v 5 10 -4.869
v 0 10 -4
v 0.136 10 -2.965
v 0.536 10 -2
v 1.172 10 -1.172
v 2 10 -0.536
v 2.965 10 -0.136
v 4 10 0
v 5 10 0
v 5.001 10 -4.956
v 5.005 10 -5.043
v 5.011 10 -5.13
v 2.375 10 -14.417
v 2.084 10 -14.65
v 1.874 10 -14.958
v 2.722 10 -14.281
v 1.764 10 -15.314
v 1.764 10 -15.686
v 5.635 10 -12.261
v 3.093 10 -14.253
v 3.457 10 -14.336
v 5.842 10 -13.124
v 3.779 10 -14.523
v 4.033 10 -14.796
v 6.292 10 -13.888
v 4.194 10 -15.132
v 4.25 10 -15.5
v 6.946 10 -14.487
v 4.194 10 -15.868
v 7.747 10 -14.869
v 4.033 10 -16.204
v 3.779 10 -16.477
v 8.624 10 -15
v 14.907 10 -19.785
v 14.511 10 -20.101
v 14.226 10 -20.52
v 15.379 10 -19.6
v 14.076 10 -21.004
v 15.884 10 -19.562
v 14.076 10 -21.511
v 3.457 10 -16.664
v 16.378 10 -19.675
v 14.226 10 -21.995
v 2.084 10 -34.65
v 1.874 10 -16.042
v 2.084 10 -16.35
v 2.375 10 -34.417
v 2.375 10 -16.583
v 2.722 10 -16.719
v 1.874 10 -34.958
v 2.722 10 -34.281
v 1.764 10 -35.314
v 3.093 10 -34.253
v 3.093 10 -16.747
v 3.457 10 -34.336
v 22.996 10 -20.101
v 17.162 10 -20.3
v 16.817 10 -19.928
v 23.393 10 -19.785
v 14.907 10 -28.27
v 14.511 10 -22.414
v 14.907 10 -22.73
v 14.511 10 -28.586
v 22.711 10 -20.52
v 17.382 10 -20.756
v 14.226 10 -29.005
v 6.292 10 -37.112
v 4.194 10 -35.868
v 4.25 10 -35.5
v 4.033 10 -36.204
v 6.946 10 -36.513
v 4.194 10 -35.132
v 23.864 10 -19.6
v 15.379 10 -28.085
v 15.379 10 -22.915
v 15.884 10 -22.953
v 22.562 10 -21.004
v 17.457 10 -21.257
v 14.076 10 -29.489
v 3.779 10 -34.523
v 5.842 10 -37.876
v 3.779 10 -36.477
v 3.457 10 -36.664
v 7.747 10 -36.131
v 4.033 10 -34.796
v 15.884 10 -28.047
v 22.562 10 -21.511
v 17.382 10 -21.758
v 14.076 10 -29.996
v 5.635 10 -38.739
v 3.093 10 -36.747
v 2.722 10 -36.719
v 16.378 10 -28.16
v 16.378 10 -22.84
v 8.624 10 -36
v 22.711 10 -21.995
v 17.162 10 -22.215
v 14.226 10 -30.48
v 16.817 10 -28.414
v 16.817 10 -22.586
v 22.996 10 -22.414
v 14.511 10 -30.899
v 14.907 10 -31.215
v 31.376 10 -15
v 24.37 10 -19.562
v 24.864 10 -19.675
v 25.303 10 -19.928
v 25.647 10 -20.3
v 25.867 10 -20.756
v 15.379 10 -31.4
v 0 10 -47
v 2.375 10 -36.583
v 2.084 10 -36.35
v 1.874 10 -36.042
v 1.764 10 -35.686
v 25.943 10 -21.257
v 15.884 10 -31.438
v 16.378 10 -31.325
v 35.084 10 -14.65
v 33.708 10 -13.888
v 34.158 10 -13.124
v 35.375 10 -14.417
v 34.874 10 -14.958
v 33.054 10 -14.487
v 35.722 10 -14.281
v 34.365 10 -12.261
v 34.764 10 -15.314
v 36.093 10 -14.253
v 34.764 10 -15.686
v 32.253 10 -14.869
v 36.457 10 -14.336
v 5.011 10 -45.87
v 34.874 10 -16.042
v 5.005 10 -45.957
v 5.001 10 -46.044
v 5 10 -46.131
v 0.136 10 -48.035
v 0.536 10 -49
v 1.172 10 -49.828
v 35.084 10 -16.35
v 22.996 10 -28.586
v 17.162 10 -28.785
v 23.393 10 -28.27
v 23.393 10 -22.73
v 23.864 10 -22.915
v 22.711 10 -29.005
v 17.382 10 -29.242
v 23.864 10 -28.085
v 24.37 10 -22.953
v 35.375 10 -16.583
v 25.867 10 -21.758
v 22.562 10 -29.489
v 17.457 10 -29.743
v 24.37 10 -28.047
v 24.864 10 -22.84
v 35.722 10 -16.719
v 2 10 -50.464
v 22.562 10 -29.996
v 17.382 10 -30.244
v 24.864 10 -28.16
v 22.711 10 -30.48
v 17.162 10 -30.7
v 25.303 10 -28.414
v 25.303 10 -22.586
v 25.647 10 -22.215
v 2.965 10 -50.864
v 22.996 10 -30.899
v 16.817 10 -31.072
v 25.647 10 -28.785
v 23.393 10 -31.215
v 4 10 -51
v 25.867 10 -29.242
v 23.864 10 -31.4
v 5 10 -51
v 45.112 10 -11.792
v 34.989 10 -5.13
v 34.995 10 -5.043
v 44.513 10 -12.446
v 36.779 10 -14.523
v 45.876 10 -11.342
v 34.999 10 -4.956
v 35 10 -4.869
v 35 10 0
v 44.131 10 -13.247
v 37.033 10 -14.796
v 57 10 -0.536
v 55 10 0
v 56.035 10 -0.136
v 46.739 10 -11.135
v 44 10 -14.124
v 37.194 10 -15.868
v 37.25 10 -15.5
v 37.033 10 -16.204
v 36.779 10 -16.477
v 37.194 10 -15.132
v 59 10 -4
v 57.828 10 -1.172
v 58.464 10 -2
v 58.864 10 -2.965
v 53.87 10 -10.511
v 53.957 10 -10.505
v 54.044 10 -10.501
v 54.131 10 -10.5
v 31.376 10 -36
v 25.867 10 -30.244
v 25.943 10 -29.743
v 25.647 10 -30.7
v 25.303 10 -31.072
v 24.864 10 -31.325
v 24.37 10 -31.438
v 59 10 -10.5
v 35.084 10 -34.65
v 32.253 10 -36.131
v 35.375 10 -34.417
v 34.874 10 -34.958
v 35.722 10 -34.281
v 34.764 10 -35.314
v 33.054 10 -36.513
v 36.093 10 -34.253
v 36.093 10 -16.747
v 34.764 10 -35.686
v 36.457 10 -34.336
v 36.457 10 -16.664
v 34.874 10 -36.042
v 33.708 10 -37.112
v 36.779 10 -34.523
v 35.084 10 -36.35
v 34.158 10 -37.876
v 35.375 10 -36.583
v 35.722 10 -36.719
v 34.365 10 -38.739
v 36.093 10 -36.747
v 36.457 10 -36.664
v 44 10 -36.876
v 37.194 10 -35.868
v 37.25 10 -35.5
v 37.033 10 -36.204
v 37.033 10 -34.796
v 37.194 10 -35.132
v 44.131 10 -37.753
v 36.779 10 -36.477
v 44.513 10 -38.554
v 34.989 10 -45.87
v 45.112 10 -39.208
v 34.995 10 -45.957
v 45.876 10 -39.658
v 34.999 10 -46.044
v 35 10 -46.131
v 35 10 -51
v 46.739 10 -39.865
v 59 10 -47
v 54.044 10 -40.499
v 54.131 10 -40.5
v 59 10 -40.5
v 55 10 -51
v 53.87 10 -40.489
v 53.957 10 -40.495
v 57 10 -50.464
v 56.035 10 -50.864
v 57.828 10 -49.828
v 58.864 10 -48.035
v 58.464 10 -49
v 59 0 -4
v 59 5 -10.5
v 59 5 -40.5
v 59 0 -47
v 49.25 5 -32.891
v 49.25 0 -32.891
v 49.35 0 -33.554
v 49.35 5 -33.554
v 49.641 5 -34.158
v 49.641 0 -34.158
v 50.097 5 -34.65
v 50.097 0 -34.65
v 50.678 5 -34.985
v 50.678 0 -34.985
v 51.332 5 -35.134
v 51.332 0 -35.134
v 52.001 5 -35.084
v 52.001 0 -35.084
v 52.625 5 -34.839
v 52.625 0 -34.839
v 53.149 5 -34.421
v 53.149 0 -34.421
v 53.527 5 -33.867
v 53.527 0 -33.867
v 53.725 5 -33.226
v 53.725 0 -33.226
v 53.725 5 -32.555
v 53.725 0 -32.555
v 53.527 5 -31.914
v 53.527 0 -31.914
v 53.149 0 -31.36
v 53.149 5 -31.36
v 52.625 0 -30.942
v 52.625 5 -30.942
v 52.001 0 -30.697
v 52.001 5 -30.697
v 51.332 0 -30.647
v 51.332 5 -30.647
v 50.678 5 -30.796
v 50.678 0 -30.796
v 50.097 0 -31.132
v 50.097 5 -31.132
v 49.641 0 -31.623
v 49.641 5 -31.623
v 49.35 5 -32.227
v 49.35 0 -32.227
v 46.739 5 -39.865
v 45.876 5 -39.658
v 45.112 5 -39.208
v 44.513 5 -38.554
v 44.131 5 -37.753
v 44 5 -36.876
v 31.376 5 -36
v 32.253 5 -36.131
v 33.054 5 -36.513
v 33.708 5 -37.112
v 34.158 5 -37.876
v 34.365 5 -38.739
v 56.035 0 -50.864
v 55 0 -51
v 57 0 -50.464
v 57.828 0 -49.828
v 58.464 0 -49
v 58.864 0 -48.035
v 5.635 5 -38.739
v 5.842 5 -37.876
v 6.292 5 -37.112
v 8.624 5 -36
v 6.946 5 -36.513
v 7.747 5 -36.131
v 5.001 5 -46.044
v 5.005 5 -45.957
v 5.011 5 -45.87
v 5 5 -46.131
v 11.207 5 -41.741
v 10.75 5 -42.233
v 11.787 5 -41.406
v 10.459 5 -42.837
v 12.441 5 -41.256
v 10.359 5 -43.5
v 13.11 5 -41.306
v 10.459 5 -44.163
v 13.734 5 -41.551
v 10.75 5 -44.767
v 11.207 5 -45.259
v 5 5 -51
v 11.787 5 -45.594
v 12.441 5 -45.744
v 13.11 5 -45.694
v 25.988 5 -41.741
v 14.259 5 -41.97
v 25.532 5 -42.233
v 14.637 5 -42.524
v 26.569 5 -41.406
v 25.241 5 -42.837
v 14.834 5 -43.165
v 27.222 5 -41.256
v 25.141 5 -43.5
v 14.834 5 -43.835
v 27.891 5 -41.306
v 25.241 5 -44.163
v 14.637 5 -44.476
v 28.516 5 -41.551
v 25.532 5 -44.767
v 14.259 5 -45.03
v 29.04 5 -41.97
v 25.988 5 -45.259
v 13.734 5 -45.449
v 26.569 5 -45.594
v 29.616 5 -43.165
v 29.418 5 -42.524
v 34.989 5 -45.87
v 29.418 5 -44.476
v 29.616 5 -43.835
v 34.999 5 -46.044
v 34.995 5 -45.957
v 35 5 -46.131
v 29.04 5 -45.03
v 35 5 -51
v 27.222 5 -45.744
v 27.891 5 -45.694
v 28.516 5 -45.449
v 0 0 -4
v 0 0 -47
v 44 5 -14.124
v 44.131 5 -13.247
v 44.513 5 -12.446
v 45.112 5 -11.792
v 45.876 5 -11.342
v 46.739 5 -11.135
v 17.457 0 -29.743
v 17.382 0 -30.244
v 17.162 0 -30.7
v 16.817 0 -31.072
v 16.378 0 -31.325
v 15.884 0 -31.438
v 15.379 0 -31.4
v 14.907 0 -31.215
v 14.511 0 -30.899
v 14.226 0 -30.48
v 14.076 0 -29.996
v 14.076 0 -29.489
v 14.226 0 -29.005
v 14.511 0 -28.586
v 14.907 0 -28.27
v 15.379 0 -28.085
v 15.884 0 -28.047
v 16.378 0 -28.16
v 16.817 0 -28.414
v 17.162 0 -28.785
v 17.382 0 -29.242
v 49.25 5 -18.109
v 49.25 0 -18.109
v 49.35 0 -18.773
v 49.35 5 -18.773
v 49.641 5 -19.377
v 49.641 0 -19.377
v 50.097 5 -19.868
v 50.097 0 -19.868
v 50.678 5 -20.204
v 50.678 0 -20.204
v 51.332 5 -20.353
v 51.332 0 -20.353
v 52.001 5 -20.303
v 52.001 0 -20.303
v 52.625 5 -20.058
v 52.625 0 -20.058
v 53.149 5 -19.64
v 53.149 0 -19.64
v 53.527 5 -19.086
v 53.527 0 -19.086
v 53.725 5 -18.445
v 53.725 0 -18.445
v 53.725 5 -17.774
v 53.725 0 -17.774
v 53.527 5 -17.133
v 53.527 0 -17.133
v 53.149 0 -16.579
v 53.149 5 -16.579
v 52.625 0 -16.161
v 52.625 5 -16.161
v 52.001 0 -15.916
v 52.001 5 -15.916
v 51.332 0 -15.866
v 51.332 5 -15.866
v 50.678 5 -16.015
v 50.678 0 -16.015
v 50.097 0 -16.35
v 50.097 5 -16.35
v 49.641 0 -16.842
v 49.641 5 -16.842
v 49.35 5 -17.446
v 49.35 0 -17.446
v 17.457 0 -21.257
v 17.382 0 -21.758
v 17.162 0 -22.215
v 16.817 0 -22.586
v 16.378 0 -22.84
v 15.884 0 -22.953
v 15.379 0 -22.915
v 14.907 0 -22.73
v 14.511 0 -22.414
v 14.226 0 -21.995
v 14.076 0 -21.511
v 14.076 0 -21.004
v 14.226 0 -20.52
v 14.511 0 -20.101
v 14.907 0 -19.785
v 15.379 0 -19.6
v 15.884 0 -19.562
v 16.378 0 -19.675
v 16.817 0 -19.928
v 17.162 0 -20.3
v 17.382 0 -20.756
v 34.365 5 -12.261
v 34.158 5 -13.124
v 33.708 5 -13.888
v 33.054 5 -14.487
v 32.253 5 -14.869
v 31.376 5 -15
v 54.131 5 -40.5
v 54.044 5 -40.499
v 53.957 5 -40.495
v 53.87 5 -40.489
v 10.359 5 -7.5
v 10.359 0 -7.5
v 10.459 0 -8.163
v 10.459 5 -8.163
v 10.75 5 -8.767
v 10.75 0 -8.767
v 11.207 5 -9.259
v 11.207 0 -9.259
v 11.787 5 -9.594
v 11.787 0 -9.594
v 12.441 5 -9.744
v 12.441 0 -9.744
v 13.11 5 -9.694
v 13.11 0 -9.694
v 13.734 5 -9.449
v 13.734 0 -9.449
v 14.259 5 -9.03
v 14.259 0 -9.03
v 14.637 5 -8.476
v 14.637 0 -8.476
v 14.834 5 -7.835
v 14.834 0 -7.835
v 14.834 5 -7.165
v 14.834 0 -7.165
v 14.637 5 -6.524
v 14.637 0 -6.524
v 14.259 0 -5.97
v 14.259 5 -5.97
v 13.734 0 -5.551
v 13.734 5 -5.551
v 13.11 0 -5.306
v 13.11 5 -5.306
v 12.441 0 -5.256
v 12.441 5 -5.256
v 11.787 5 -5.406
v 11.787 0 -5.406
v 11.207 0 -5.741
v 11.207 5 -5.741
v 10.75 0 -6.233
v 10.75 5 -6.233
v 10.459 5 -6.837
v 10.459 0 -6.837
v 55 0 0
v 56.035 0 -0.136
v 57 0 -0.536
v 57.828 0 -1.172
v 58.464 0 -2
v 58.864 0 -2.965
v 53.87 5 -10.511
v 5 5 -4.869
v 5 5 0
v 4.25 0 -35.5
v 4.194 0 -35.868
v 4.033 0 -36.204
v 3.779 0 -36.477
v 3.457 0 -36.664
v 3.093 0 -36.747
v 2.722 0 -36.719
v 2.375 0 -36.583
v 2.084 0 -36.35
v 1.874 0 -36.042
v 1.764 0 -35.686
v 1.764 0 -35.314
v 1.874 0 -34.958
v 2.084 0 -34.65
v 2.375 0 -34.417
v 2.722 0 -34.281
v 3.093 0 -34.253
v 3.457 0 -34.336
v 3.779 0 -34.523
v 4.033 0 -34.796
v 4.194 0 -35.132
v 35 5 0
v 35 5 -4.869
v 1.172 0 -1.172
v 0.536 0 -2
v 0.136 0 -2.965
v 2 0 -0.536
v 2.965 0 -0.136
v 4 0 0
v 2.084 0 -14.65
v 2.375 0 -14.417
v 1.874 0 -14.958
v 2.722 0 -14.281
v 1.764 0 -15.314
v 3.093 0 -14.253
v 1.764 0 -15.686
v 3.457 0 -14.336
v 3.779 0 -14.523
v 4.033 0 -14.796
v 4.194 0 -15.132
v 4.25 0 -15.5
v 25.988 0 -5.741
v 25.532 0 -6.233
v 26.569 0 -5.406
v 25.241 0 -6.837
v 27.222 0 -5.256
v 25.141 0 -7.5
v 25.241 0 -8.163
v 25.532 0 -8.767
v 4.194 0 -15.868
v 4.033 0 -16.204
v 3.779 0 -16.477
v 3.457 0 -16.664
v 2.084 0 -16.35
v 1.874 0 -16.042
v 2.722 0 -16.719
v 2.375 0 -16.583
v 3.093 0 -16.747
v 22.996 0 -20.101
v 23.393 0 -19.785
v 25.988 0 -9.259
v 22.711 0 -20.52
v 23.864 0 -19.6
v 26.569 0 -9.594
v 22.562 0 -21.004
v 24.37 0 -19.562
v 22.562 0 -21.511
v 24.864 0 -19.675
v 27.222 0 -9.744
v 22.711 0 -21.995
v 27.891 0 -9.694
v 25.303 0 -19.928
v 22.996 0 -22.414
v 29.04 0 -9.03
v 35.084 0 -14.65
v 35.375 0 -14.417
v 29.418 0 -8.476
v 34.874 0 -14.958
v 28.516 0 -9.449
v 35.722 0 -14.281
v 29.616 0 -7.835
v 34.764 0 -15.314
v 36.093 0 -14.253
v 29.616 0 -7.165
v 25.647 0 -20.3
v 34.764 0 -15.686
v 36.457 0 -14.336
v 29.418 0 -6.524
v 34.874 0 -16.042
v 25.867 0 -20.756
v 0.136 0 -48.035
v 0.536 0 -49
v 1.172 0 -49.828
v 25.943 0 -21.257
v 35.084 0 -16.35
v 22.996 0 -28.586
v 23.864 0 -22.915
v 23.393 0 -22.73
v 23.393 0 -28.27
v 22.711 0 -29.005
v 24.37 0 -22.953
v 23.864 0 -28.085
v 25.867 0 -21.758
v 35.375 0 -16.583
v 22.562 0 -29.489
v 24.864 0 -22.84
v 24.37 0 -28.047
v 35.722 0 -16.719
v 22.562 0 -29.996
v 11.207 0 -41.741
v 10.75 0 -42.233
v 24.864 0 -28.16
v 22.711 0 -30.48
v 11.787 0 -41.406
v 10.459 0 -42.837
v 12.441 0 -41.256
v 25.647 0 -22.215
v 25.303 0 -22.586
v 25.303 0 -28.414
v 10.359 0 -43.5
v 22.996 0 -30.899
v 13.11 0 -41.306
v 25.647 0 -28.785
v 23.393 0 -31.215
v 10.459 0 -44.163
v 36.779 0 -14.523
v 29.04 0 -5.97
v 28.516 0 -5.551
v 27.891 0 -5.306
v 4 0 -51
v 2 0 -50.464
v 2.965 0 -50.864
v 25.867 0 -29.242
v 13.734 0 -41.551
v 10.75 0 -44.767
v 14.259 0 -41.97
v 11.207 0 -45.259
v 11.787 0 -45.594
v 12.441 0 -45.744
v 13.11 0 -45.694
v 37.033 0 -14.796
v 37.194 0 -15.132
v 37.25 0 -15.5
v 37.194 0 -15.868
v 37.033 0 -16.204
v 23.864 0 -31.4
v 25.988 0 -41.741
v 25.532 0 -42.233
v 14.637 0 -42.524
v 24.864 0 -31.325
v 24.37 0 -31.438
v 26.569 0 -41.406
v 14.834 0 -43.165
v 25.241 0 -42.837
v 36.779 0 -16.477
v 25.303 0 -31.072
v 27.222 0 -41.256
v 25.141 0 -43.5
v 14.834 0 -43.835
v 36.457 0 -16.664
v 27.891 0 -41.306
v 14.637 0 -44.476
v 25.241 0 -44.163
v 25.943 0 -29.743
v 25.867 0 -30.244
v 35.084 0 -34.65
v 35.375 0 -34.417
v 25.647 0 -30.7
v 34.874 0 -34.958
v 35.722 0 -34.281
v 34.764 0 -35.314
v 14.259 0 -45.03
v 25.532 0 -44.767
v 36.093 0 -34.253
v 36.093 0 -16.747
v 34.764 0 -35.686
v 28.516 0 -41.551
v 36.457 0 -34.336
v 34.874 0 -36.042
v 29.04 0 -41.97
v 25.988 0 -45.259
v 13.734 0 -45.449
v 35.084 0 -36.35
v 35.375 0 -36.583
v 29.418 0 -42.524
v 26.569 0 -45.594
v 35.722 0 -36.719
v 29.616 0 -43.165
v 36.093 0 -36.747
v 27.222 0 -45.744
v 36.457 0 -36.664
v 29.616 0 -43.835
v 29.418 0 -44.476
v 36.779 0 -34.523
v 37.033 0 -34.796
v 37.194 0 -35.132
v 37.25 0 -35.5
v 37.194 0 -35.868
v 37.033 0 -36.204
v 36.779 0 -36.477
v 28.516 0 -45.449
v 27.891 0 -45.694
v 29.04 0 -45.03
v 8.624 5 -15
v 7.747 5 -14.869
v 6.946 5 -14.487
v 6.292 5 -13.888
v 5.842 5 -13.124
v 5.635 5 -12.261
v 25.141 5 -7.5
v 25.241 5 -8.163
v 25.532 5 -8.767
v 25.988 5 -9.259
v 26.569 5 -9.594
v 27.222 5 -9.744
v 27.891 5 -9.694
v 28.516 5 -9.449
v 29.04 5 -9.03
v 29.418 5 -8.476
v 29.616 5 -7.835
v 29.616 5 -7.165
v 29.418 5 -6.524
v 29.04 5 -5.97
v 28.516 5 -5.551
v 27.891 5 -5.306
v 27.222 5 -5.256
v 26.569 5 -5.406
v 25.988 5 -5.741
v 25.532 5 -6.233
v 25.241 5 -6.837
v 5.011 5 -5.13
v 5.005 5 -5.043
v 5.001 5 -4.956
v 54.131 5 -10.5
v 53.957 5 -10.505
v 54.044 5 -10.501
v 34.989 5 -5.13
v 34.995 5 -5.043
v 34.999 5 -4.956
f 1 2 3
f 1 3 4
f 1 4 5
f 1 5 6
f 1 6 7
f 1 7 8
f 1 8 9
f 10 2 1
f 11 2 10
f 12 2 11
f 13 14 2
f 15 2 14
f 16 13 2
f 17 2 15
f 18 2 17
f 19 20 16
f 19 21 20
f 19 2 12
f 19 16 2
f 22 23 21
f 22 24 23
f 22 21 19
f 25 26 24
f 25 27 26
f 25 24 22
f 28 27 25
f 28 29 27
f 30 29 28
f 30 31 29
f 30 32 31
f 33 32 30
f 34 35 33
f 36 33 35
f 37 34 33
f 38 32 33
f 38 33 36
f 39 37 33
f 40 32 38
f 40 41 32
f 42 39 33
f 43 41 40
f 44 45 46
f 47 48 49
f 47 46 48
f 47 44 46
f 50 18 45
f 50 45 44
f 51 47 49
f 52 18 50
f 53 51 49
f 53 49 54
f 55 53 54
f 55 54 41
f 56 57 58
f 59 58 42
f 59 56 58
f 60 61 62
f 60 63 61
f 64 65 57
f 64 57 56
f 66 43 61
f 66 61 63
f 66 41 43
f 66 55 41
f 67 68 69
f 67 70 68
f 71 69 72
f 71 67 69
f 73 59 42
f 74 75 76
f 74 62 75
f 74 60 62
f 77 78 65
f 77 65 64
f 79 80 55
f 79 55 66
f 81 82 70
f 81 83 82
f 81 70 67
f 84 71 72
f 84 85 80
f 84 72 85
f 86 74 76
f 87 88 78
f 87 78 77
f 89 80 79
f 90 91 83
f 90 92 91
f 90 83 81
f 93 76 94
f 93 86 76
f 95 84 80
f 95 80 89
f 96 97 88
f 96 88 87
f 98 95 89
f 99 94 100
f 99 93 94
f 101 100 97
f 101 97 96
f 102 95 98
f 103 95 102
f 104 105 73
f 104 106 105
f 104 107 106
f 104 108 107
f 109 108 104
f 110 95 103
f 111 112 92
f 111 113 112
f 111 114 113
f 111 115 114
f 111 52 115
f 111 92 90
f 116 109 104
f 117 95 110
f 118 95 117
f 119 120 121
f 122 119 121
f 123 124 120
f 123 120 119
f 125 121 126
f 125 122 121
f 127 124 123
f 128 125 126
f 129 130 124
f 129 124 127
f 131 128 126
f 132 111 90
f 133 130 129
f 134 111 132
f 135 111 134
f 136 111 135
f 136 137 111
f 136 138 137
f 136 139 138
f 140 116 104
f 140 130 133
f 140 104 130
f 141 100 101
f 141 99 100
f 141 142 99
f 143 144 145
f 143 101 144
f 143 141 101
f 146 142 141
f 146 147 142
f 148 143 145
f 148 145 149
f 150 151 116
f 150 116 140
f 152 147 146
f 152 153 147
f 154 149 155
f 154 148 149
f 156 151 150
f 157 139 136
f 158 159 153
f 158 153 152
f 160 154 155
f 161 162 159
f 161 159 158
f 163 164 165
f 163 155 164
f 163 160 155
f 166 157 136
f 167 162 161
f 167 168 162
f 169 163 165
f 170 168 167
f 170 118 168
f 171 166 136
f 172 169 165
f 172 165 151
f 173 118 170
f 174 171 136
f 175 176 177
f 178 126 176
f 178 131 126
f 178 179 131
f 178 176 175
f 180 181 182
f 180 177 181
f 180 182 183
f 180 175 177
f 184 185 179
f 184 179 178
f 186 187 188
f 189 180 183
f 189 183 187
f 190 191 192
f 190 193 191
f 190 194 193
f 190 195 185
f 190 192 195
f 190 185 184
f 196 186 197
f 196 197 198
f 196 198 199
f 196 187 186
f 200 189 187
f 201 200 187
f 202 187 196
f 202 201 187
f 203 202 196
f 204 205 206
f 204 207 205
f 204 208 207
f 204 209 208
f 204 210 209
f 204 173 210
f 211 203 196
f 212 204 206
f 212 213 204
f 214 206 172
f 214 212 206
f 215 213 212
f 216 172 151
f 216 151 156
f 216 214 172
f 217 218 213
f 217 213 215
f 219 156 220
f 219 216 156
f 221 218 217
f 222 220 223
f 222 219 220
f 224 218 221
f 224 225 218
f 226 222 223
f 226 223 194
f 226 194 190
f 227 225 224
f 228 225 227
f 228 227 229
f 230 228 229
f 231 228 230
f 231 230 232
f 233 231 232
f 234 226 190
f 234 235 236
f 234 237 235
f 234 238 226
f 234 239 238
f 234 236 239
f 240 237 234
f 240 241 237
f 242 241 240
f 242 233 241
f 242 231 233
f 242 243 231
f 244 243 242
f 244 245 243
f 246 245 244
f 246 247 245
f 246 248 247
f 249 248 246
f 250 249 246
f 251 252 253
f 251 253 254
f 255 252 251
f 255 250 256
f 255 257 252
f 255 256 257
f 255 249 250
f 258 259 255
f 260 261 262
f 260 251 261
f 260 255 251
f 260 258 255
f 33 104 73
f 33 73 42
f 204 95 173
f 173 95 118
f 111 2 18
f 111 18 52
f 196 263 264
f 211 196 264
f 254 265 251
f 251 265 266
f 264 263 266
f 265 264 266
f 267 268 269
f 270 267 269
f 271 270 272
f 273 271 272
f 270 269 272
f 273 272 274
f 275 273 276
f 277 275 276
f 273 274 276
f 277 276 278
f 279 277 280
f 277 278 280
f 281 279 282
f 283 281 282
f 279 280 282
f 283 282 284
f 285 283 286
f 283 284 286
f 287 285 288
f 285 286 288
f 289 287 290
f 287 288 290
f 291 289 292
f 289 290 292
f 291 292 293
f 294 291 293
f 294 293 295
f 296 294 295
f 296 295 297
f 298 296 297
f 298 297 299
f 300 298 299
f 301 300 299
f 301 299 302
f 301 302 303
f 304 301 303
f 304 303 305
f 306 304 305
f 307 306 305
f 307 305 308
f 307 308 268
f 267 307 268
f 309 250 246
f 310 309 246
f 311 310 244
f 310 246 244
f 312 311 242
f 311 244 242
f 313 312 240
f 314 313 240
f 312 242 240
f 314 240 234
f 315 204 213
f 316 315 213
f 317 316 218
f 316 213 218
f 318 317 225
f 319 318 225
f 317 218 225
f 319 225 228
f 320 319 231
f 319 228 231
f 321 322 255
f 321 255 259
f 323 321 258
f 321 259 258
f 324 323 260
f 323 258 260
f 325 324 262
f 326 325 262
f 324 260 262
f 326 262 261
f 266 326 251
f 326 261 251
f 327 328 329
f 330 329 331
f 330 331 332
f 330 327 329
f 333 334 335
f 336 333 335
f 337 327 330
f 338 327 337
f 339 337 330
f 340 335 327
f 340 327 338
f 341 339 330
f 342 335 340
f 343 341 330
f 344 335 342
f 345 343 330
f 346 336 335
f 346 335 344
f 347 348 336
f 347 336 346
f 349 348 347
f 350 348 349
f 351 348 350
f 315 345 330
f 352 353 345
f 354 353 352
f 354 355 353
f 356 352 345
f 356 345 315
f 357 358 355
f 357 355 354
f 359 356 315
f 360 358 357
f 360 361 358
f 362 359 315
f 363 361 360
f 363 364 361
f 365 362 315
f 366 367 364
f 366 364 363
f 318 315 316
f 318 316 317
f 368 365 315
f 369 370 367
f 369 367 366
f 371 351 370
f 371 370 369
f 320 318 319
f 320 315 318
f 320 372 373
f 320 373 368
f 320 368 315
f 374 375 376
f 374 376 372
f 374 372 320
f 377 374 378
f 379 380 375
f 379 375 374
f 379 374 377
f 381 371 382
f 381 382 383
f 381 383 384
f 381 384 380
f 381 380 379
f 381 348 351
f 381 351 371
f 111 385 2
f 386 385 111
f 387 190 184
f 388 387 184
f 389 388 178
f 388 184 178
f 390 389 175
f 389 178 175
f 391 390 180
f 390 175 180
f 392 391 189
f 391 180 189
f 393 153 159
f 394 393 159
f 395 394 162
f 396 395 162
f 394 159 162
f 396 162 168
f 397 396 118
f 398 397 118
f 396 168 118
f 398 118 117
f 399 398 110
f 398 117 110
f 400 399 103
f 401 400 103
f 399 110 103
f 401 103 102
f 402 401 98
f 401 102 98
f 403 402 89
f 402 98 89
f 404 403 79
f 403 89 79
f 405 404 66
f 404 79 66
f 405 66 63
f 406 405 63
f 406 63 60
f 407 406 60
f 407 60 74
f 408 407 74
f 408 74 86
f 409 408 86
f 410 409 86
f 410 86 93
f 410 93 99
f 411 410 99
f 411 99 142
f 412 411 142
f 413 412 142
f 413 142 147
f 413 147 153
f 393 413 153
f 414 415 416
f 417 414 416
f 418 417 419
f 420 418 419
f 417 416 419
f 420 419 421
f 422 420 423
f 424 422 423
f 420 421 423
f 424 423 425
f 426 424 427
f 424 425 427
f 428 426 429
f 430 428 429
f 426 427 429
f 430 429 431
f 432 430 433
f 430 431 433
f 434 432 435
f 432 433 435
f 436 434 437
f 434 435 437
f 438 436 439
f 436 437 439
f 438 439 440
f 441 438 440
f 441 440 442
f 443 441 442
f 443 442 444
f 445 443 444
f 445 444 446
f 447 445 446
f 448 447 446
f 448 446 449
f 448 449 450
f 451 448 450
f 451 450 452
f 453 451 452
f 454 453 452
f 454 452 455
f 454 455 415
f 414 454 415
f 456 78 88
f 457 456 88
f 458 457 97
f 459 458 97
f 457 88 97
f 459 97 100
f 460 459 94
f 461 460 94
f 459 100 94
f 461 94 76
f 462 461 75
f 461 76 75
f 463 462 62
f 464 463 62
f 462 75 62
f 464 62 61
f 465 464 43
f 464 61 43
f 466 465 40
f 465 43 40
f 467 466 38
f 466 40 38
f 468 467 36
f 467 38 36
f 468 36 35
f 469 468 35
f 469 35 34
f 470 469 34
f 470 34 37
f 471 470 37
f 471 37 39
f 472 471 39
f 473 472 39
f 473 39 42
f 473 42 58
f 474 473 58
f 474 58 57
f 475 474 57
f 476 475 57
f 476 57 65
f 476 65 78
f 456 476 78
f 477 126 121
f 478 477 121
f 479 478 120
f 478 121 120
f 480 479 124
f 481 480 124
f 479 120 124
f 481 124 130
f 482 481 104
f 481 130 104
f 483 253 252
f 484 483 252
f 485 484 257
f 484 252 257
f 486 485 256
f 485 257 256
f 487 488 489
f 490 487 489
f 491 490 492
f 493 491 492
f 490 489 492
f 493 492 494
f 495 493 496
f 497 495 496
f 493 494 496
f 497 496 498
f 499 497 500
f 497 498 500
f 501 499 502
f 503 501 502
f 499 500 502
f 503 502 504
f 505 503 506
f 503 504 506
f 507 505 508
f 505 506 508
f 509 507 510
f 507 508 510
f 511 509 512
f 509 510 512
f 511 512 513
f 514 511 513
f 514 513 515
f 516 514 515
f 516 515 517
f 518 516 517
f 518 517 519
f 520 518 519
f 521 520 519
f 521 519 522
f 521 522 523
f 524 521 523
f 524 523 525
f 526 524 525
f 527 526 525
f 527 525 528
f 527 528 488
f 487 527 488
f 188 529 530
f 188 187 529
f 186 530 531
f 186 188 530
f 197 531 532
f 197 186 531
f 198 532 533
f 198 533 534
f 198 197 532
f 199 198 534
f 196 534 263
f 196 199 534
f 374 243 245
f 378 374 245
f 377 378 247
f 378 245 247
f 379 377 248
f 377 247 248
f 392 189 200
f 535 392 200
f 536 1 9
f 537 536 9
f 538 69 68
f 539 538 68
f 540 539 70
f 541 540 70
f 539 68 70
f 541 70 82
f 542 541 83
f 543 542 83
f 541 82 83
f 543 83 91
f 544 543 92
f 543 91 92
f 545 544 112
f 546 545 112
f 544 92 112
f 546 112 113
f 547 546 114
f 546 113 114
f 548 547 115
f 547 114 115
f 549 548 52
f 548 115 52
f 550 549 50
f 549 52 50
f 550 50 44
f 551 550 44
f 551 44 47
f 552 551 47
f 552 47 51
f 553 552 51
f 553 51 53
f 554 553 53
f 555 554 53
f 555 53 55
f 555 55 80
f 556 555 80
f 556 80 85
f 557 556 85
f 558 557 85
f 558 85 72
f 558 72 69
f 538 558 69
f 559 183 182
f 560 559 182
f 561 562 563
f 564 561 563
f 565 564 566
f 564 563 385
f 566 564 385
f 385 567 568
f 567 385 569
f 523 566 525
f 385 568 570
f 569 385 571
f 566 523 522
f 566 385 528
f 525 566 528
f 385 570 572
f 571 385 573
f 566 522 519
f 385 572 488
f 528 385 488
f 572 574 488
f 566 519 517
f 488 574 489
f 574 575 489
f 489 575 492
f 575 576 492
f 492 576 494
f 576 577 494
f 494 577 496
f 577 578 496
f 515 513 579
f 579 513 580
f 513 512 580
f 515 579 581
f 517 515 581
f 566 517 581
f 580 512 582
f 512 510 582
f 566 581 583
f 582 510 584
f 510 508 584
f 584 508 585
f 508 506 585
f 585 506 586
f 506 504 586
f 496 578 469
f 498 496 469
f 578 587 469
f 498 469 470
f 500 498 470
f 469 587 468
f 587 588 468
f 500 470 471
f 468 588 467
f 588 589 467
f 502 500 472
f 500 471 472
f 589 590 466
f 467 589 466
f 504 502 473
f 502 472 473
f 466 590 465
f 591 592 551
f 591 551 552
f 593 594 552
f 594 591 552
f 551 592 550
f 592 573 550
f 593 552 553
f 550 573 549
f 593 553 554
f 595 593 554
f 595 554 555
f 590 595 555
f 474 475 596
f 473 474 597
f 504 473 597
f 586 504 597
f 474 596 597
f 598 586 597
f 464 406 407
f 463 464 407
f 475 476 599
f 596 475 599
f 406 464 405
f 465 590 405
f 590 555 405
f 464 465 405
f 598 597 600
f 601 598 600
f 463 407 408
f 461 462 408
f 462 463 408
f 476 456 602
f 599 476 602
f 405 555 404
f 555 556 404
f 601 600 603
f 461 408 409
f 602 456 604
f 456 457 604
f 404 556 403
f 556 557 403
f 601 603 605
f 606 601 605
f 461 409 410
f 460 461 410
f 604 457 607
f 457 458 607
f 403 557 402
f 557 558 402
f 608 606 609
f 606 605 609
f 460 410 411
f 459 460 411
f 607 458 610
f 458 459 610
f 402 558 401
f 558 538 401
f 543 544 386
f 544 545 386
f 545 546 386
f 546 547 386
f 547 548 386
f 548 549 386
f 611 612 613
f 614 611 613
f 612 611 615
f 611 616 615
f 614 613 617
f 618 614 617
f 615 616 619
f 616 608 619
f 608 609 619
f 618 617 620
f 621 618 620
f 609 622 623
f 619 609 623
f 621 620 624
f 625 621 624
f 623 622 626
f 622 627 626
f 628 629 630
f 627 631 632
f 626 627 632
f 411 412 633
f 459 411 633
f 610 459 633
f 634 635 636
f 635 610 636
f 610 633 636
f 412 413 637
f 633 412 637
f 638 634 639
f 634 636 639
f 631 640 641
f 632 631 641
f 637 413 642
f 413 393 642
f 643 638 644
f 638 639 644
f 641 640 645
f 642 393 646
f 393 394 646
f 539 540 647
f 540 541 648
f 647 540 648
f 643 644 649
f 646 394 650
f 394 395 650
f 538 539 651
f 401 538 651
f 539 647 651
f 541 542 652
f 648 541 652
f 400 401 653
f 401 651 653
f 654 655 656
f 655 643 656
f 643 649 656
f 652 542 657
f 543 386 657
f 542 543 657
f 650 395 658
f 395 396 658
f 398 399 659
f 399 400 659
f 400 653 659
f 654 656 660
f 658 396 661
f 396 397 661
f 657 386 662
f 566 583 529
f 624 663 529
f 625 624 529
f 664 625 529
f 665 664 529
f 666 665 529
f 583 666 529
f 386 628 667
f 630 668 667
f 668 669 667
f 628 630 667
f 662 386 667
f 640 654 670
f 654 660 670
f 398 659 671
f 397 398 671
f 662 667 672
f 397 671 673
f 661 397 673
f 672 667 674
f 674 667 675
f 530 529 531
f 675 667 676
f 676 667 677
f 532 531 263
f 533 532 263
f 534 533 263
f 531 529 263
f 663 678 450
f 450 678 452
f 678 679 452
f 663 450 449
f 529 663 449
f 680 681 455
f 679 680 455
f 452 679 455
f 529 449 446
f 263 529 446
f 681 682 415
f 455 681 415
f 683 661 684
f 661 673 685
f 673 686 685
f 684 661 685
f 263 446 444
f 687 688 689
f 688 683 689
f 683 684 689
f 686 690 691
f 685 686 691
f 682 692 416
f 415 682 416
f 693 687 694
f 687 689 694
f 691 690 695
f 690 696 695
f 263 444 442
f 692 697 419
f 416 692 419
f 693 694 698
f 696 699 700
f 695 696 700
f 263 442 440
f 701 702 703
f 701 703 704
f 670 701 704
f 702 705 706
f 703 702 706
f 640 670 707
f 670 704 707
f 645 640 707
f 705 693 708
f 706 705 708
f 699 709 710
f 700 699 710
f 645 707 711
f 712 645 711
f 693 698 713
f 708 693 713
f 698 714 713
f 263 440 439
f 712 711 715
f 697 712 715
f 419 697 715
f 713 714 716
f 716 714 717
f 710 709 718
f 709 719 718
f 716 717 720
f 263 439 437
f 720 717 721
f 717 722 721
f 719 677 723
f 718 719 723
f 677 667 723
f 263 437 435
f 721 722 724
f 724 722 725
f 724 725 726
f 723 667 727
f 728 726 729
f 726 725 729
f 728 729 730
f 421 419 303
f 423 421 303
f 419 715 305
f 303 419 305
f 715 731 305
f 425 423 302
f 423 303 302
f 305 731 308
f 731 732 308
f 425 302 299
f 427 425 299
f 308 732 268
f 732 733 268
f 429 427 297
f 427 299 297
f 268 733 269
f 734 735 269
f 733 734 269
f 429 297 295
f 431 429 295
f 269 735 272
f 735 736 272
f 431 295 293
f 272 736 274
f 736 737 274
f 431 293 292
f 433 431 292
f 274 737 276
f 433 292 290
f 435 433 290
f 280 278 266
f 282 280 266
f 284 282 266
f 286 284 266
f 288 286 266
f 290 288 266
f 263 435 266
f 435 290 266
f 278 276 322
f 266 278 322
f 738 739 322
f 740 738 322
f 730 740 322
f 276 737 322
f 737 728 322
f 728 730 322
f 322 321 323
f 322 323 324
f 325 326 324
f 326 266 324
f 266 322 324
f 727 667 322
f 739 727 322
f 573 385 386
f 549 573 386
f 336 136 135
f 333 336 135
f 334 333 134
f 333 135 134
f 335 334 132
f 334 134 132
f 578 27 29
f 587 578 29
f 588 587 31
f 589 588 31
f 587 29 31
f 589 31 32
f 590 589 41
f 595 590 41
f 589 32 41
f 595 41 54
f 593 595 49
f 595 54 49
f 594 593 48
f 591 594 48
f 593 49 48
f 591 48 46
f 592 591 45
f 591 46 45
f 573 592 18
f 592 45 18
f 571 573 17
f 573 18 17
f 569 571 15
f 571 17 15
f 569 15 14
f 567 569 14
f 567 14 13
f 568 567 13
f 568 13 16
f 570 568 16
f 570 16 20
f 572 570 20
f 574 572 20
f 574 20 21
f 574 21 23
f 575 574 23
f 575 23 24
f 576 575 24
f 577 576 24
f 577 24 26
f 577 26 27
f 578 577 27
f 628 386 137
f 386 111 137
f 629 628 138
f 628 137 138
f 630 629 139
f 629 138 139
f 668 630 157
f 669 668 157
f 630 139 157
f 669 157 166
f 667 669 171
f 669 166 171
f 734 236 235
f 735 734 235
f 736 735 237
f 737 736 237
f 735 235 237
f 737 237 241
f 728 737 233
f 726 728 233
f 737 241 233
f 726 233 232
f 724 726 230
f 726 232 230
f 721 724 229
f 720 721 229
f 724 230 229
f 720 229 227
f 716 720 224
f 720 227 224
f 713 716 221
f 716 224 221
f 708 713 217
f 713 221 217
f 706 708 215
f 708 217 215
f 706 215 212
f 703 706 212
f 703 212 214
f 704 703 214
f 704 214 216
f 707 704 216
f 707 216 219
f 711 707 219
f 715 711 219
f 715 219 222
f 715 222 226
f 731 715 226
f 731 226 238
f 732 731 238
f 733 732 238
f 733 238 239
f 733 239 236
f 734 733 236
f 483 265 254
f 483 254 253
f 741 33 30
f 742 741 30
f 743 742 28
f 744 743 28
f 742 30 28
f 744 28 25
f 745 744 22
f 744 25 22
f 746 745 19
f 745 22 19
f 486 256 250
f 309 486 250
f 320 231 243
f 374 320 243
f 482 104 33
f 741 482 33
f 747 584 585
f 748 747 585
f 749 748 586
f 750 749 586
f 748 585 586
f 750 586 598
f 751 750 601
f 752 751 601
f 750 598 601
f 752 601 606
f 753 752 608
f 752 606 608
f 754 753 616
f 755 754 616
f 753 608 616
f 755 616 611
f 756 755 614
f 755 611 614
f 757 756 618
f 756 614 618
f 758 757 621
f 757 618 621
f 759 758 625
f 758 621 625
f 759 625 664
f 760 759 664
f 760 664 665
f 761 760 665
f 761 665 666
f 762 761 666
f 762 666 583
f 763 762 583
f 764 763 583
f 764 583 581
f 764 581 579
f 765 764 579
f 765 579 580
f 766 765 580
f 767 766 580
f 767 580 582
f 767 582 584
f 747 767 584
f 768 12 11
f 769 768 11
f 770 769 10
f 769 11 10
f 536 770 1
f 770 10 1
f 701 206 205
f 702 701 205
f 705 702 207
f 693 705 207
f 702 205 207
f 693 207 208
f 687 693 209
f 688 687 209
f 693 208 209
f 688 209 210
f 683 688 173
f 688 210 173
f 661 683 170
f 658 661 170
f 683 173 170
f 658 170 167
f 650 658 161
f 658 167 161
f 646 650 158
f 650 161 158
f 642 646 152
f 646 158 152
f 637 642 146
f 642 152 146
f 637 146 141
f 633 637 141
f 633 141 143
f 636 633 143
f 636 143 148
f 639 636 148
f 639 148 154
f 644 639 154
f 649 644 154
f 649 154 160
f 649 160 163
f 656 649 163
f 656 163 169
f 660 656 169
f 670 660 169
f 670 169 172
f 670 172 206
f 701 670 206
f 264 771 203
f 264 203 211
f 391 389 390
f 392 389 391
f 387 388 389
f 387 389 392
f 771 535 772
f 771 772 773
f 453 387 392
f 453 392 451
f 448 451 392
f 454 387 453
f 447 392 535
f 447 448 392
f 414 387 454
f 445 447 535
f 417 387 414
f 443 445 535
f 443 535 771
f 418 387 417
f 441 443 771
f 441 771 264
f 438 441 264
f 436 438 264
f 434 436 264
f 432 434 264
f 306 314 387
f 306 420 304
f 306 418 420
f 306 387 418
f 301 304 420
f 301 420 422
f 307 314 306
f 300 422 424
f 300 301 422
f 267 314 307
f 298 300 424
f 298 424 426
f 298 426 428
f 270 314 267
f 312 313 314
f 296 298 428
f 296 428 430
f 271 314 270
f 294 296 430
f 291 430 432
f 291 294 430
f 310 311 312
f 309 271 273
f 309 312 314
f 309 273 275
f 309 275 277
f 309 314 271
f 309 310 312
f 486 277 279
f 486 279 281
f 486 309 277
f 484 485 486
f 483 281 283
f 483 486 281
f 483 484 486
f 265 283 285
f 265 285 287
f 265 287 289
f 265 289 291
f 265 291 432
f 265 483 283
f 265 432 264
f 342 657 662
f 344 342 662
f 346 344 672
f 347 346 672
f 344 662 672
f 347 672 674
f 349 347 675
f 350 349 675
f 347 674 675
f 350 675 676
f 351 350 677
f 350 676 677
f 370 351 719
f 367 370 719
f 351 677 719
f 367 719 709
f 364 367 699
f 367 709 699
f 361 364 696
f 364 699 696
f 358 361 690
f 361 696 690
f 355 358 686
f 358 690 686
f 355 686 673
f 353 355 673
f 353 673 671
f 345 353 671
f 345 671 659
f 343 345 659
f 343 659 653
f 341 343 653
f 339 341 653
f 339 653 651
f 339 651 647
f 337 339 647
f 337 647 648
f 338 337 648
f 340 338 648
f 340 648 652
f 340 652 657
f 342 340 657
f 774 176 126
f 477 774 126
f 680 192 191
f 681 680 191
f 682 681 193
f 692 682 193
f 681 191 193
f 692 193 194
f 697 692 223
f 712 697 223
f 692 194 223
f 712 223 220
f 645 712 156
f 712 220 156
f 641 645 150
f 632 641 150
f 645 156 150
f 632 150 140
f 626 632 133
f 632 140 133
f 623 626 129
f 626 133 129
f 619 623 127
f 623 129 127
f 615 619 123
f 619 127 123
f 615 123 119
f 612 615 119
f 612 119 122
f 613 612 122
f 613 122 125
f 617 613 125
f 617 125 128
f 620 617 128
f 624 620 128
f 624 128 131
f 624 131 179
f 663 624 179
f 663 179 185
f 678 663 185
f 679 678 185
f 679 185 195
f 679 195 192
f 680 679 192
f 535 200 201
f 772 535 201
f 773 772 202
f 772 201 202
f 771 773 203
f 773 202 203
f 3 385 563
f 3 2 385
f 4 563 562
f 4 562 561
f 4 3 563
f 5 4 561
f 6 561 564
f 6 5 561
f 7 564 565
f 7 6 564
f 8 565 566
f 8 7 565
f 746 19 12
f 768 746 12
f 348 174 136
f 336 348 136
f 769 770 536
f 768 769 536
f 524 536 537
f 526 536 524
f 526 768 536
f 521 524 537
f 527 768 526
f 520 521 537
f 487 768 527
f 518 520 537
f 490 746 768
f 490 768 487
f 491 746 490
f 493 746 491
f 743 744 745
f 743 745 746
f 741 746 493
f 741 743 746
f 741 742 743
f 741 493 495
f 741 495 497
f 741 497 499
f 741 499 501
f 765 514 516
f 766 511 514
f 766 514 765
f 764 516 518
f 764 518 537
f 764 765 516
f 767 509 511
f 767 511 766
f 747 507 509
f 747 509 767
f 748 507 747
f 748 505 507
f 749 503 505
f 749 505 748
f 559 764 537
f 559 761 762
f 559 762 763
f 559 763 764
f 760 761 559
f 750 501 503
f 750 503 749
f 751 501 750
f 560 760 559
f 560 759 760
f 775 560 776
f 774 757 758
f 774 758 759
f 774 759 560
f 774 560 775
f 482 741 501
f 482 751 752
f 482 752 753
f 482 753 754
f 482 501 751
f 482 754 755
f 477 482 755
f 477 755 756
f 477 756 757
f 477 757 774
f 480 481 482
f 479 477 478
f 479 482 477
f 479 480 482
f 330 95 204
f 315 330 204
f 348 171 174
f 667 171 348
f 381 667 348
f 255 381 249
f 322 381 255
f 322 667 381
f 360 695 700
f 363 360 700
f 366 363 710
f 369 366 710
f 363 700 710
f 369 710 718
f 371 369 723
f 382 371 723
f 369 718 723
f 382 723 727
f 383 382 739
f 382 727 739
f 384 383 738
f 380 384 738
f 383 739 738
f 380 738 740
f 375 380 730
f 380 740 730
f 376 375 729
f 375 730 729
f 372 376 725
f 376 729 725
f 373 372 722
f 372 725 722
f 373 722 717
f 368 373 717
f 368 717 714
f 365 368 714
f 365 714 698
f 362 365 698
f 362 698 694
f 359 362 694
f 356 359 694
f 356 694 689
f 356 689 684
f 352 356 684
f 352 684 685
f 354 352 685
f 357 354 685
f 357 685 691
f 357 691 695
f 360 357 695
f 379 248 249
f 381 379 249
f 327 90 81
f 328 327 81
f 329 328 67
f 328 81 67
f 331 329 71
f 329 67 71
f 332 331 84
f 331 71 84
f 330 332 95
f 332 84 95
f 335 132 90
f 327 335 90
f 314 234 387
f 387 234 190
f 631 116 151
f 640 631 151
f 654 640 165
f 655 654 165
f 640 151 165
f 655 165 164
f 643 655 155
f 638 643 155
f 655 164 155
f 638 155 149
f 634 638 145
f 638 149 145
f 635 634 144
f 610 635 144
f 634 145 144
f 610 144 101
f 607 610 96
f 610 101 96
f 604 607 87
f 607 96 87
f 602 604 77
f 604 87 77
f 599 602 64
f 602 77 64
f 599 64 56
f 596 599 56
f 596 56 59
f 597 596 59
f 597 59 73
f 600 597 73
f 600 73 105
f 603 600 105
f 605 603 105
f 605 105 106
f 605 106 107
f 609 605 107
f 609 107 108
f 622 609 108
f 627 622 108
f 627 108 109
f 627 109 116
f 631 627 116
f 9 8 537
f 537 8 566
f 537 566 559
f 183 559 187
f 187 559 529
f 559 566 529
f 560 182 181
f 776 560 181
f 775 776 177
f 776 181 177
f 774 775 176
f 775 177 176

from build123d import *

# Parameters (mm, degrees)
SKETCH_1_W          = 59
SKETCH_1_H          = 51
EXTRUDE_1_DEPTH     = 10
CUT_EXTRUDE_5_DEPTH = 5
HOLE_WIZARD_M31_D   = 3.4
FILLET_1_R          = 4
FILLET_2_R          = 4
CUT_EXTRUDE_6_DEPTH = 5
HOLE_WIZARD_M42_D   = 4.5
M3X0_51_D           = 2.5


with BuildPart() as part:
    # Эскиз1 → Бобышка-Вытянуть1 (new body)
    with BuildSketch(Plane(origin=(0, 0, 0), x_dir=(1, 0, 0), z_dir=(0, 1, 0))):
        with Locations((29.5, 25.5)):
            Rectangle(SKETCH_1_W, SKETCH_1_H)
    extrude(amount=EXTRUDE_1_DEPTH)

    # Эскиз13 → Вырез-Вытянуть5 (cut)
    with BuildSketch(Plane(origin=(28.521351565, 10, -17.681729678), x_dir=(1, 0, 0), z_dir=(0, 1, 0))):
        with BuildLine():
            Line((30.478648435, 22.818270322), (25.609631264, 22.818270322))
            ThreePointArc((25.609631264, 22.818270322), (25.478773101, 22.815414987), (25.348164035, 22.806854417))
            Line((25.348164035, 22.806854417), (18.217181207, 22.182974259))
            ThreePointArc((18.217181207, 22.182974259), (16.266816424, 21.221160788), (15.478648435, 19.194390165))
            Line((15.478648435, 19.194390165), (15.478648435, -3.55784952))
            ThreePointArc((15.478648435, -3.55784952), (16.266816424, -5.584620143), (18.217181207, -6.546433615))
            Line((18.217181207, -6.546433615), (25.348164035, -7.170313772))
            ThreePointArc((25.348164035, -7.170313772), (25.478773101, -7.178874342), (25.609631264, -7.181729678))
            Line((25.609631264, -7.181729678), (30.478648435, -7.181729678))
            Line((30.478648435, -7.181729678), (30.478648435, 22.818270322))
        make_face()
    extrude(amount=-CUT_EXTRUDE_5_DEPTH, mode=Mode.SUBTRACT)

    # Отверстие с зазором M31 (through all)
    with Locations(Plane(origin=(0, 0, 0), x_dir=(-1, 0, 0), z_dir=(0, -1, 0))):
        with Locations((-24.242640687, 29.742640687), (-15.757359313, 29.742640687), (-15.757359313, 21.257359313), (-24.242640687, 21.257359313)):
            Hole(HOLE_WIZARD_M31_D / 2)

    # Скругление1
    fillet_1_edges = [part.edges().sort_by_distance(p)[0] for p in [
        (0, 5, -51),
        (0, 5, 0),
    ]]
    fillet(fillet_1_edges, radius=FILLET_1_R)

    # Скругление2
    fillet_2_edges = [part.edges().sort_by_distance(p)[0] for p in [
        (59, 5, -51),
        (59, 5, 0),
    ]]
    fillet(fillet_2_edges, radius=FILLET_2_R)

    # Эскиз14 → Вырез-Вытянуть6 (cut)
    with BuildSketch(Plane(origin=(28.521351565, 10, -17.681729678), x_dir=(1, 0, 0), z_dir=(0, 1, 0))):
        with BuildLine():
            Line((-23.521351565, -12.812712506), (-23.521351565, -17.681729678))
            Line((-23.521351565, -17.681729678), (6.478648435, -17.681729678))
            Line((6.478648435, -17.681729678), (6.478648435, -12.812712506))
            ThreePointArc((6.478648435, -12.812712506), (6.4757931, -12.681854344), (6.467232529, -12.551245278))
            Line((6.467232529, -12.551245278), (5.843352372, -5.420262449))
            ThreePointArc((5.843352372, -5.420262449), (4.8815389, -3.469897667), (2.854768277, -2.681729678))
            Line((2.854768277, -2.681729678), (-19.897471408, -2.681729678))
            ThreePointArc((-19.897471408, -2.681729678), (-21.924242031, -3.469897667), (-22.886055502, -5.420262449))
            Line((-22.886055502, -5.420262449), (-23.509935659, -12.551245278))
            ThreePointArc((-23.509935659, -12.551245278), (-23.51849623, -12.681854344), (-23.521351565, -12.812712506))
        make_face()
        with BuildLine():
            Line((6.478648435, 28.449253151), (6.478648435, 33.318270322))
            Line((6.478648435, 33.318270322), (-23.521351565, 33.318270322))
            Line((-23.521351565, 33.318270322), (-23.521351565, 28.449253151))
            ThreePointArc((-23.521351565, 28.449253151), (-23.51849623, 28.318394989), (-23.509935659, 28.187785923))
            Line((-23.509935659, 28.187785923), (-22.886055502, 21.056803094))
            ThreePointArc((-22.886055502, 21.056803094), (-21.924242031, 19.106438312), (-19.897471408, 18.318270322))
            Line((-19.897471408, 18.318270322), (2.854768277, 18.318270322))
            ThreePointArc((2.854768277, 18.318270322), (4.8815389, 19.106438312), (5.843352372, 21.056803094))
            Line((5.843352372, 21.056803094), (6.467232529, 28.187785923))
            ThreePointArc((6.467232529, 28.187785923), (6.4757931, 28.318394989), (6.478648435, 28.449253151))
        make_face()
    extrude(amount=-CUT_EXTRUDE_6_DEPTH, mode=Mode.SUBTRACT)

    # Отверстие с зазором M42 (through all)
    with Locations(Plane(origin=(28.521351565, 5, -17.681729678), x_dir=(1, 0, 0), z_dir=(0, 1, 0))):
        with Locations((-15.911990736, 25.818270322), (-1.130712395, 25.818270322), (22.978648435, 15.208909493), (22.978648435, 0.427631152), (-1.130712395, -10.181729678), (-15.911990736, -10.181729678)):
            Hole(HOLE_WIZARD_M42_D / 2)

    # Отверстие обработанное метчиком M3x0.51 (through all)
    with Locations(Plane(origin=(33.500358967, 0, -26.410335717), x_dir=(-1, 0, 0), z_dir=(0, -1, 0))):
        with Locations((30.500358967, -10.910335717), (-2.499641033, -10.910335717), (-2.499641033, 9.089664283), (30.500358967, 9.089664283)):
            Hole(M3X0_51_D / 2)


solid = part.part
